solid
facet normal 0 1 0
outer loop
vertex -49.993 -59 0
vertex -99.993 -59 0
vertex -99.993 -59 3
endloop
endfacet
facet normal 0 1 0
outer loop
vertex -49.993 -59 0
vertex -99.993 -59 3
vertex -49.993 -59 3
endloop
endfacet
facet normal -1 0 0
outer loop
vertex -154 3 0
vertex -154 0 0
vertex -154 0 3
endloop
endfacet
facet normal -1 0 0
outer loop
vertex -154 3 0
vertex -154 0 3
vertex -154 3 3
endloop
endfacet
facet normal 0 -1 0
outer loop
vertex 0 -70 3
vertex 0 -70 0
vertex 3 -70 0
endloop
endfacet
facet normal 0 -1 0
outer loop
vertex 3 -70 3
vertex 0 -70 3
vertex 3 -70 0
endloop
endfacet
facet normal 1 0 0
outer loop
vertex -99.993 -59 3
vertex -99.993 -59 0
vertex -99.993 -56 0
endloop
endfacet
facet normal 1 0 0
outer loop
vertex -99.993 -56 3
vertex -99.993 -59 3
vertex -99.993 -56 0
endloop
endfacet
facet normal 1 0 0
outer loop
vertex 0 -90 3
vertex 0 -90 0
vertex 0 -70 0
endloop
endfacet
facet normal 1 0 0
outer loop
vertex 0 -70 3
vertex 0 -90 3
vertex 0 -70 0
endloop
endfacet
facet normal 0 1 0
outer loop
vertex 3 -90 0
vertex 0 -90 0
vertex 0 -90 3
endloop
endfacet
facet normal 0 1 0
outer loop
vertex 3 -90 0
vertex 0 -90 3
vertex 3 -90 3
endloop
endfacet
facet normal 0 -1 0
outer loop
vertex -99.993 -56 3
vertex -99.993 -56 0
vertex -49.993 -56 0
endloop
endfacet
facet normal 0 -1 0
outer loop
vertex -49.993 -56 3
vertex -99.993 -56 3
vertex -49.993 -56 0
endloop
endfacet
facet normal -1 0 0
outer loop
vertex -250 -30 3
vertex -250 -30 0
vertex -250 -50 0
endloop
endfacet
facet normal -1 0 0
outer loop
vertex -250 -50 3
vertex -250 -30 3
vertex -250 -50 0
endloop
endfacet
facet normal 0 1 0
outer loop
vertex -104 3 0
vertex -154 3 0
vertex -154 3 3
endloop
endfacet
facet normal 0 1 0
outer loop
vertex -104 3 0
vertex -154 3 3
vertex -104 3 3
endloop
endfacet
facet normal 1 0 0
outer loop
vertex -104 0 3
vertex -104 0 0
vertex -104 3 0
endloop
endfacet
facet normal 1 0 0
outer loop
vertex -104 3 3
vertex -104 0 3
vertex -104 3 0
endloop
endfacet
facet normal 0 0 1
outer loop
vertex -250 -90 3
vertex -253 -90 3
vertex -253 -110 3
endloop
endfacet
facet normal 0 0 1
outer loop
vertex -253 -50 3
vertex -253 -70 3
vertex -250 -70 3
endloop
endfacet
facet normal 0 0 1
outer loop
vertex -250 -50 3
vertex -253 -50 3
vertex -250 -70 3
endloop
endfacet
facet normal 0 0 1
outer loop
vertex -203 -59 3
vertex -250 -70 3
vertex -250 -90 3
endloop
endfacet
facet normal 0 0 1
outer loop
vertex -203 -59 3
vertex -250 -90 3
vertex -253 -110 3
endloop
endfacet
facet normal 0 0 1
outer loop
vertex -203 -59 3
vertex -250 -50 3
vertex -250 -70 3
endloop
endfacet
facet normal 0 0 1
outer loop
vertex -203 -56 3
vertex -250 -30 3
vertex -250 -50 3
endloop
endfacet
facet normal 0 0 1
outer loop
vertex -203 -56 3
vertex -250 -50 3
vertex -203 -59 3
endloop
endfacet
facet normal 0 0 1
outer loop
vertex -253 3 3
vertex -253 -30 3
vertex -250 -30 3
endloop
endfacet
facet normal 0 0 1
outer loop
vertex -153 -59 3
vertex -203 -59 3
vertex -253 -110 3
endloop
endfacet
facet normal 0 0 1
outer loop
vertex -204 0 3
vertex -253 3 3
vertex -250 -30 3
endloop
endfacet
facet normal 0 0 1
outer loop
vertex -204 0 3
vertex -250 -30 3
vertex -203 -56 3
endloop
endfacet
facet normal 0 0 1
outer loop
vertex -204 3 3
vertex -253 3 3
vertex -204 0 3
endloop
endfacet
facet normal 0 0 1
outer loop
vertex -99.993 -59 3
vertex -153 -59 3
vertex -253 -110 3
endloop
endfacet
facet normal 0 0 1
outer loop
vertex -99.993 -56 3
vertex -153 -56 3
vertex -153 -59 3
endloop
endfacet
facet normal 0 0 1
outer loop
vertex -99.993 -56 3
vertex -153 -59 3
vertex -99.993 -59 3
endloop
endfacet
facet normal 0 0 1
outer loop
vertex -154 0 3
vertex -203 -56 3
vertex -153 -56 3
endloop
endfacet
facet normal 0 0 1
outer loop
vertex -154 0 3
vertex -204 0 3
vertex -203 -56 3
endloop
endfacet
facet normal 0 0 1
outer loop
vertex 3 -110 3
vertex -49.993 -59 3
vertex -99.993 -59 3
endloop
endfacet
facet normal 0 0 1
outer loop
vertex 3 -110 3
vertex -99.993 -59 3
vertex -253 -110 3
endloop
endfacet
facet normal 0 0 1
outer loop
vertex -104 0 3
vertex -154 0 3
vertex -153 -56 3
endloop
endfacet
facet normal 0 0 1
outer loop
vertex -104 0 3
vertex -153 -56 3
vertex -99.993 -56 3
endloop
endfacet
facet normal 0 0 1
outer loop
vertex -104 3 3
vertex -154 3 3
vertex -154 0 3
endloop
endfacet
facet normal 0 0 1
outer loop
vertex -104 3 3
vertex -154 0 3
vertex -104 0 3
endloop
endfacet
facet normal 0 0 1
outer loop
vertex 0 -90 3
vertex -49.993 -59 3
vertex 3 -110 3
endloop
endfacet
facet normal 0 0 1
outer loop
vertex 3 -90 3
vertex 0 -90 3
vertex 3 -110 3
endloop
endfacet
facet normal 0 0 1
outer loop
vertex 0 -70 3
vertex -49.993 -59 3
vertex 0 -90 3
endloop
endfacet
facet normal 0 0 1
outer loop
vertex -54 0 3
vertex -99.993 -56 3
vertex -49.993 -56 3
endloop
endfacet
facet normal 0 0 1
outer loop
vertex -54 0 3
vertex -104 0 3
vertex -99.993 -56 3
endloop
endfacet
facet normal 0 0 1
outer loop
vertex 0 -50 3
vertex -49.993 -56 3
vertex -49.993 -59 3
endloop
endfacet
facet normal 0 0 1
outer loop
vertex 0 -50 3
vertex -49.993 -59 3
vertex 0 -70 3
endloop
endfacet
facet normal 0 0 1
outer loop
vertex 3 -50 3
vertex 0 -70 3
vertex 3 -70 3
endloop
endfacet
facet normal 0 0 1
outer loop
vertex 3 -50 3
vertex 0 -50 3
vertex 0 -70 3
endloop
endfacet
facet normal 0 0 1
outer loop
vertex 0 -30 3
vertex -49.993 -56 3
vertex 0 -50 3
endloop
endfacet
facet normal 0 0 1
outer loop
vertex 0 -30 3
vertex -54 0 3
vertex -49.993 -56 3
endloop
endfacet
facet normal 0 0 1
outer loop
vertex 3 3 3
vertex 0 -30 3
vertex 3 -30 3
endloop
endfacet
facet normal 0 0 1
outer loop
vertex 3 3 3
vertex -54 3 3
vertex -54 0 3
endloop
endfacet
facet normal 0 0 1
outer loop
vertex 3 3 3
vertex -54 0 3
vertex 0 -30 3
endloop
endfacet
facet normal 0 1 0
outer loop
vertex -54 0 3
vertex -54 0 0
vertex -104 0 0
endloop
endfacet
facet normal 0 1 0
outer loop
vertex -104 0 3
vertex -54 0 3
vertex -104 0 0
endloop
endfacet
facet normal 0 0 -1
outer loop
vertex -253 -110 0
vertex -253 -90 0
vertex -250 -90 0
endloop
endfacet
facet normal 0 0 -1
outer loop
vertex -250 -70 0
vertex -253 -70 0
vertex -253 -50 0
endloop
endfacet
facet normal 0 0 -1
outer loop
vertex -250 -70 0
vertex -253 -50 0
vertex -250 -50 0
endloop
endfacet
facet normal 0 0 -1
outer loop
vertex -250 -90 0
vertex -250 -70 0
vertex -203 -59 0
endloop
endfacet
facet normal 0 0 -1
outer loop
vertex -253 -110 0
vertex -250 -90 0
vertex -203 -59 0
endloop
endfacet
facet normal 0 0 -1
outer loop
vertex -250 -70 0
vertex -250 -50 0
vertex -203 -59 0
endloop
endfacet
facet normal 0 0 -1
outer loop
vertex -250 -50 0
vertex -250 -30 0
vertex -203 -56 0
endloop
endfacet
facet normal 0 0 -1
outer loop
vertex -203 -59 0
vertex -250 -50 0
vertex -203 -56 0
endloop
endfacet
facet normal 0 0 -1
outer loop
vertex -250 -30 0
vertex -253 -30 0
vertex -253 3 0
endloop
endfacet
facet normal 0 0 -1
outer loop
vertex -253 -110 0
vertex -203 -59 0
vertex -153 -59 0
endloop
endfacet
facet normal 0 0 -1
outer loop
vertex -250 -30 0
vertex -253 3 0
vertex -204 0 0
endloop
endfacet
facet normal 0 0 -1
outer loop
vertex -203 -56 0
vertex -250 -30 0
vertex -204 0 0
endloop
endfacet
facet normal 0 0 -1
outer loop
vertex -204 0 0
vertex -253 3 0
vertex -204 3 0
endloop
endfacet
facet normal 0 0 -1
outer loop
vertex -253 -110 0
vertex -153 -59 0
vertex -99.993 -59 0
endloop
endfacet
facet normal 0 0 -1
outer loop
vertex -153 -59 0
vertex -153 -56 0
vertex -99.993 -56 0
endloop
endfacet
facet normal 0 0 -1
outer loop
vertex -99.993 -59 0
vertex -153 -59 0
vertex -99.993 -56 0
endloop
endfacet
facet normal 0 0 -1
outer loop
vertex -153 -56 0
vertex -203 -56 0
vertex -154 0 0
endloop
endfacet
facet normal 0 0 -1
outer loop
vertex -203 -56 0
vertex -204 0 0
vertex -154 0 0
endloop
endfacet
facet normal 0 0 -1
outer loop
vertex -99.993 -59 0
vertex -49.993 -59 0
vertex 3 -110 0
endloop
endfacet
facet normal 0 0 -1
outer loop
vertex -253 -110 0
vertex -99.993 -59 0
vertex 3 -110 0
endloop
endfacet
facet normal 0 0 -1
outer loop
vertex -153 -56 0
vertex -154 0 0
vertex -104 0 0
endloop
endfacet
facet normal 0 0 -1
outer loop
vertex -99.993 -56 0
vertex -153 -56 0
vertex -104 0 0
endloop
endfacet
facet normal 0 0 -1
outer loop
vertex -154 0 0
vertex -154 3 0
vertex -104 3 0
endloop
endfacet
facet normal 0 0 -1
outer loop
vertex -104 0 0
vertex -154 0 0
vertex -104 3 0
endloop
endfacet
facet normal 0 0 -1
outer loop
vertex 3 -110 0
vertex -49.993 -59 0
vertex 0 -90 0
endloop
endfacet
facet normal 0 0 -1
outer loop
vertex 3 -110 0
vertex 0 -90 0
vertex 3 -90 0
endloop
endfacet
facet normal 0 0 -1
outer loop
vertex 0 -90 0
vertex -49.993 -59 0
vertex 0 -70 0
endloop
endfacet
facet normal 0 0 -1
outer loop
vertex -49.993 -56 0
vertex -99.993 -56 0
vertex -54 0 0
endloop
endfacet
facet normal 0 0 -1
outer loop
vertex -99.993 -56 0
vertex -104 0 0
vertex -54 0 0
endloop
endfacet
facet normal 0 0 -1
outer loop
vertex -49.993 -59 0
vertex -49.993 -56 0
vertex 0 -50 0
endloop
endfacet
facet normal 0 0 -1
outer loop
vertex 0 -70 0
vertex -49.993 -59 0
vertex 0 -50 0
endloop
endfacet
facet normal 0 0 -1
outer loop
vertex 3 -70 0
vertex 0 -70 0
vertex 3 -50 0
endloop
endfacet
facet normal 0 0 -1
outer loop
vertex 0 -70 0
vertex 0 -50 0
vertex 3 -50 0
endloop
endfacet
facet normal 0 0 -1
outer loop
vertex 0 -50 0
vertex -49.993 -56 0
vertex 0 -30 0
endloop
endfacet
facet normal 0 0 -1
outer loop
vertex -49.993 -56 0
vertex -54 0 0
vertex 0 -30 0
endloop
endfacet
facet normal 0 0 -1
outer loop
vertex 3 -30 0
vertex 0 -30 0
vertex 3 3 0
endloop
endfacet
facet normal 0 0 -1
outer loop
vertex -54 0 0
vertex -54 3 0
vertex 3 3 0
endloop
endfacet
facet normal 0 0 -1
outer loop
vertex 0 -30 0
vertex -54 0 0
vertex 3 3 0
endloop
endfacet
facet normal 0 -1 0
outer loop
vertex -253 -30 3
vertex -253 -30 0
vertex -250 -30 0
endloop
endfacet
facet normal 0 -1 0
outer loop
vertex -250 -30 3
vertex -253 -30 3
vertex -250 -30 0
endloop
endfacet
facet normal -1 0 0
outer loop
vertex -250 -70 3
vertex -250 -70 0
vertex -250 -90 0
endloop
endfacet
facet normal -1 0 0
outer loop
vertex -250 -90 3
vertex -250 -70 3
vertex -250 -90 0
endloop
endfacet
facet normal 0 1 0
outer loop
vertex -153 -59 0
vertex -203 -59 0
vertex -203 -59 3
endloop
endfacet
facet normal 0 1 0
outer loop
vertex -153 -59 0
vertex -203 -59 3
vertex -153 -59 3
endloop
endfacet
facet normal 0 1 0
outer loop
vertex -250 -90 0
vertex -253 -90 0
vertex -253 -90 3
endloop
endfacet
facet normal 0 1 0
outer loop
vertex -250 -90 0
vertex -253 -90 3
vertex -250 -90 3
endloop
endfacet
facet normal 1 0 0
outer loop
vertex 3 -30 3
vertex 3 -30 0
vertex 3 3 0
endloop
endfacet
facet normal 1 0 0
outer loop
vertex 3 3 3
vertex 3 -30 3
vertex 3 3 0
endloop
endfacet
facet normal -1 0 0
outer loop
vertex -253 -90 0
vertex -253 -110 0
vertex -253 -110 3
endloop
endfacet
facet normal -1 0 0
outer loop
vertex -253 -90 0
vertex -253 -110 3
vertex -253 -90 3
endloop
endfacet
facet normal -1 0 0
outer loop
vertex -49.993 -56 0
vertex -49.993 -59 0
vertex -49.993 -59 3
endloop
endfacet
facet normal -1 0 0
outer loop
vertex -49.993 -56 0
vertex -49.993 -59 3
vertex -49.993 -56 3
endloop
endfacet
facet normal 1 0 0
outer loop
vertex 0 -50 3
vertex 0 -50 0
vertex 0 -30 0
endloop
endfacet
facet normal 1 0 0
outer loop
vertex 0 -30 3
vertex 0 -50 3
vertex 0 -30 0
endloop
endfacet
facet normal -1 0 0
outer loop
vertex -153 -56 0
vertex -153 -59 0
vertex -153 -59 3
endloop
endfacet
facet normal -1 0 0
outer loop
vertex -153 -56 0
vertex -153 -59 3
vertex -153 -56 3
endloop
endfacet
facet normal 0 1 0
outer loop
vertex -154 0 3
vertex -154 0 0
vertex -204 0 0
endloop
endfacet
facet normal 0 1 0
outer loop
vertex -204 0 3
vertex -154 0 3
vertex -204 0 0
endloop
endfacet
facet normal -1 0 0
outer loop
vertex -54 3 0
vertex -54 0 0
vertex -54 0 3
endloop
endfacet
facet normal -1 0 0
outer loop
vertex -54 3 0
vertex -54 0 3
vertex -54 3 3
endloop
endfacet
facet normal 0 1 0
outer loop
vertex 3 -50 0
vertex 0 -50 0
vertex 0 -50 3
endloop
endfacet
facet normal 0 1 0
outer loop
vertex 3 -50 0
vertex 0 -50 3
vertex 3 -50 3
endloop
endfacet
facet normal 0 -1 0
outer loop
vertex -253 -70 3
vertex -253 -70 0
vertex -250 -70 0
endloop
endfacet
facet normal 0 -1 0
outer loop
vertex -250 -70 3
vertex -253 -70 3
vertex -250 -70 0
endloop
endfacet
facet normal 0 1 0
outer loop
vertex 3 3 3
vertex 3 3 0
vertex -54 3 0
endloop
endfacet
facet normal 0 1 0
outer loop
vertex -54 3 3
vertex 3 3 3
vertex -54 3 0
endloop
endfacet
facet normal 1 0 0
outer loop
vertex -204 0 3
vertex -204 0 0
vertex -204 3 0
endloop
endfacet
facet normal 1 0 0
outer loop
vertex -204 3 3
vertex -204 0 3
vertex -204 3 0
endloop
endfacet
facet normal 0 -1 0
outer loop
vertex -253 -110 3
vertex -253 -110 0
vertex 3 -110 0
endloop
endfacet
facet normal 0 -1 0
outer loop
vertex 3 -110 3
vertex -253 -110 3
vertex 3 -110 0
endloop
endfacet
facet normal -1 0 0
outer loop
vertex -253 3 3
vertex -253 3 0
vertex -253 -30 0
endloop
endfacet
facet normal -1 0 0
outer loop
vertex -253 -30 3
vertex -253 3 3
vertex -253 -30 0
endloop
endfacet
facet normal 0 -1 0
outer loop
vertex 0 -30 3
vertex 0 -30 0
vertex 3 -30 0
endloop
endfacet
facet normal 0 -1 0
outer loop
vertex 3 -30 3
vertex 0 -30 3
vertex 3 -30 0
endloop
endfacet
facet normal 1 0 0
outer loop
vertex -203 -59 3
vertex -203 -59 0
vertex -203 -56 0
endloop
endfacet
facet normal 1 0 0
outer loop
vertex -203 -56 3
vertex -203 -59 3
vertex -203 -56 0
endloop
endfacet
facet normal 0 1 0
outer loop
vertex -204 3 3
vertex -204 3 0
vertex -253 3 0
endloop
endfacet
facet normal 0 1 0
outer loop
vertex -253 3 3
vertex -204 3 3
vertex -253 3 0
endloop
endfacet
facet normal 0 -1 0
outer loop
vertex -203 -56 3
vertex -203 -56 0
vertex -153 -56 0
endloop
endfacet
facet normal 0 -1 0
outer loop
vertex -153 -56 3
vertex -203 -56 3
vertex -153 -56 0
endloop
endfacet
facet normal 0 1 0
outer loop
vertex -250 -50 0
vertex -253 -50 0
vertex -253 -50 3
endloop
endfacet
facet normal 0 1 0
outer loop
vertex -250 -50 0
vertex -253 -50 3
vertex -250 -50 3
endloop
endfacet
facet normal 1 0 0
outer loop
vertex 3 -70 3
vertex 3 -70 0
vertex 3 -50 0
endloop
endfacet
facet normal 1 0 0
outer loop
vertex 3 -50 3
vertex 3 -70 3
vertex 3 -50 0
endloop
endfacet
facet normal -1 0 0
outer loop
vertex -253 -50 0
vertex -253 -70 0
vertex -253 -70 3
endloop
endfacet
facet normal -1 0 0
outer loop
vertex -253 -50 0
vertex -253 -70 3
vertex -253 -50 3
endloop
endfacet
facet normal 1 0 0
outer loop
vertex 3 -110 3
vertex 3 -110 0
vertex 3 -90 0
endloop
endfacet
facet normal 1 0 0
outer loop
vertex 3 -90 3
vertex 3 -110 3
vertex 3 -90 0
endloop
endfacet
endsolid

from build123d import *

# Parameters (mm, degrees)
F0_W     = 46
F0_H     = 3
F0_W_2   = 50
F0_W_3   = 3
F0_H_2   = 20
F0_W_4   = 54
F1_DEPTH = 3


with BuildPart() as f1:
    # F0 (on Top) → F1 (new body)
    with BuildSketch(Plane.XY):
        with Locations((-227, 1.5)):
            Rectangle(F0_W, F0_H)
        Polygon((-204, 0), (-250, 0), (-250, -30), (-250, -50), (-250, -70), (-250, -90), (-250, -110), (0, -110), (0, -90), (0, -70), (0, -50), (0, -30), (0, 0), (-54, 0), (-104, 0), (-154, 0), align=None)
        with Locations((-178, -57.5)):
            Rectangle(F0_W_2, F0_H, mode=Mode.SUBTRACT)
        with Locations((-74.99309, -57.5)):
            Rectangle(F0_W_2, F0_H, mode=Mode.SUBTRACT)
        Polygon((-250, -30), (-250, 0), (-250, 3), (-253, 3), (-253, -30), align=None)
        with Locations((-129, 1.5)):
            Rectangle(F0_W_2, F0_H)
        with Locations((-251.5, -60)):
            Rectangle(F0_W_3, F0_H_2)
        with Locations((-27, 1.5)):
            Rectangle(F0_W_4, F0_H)
        with Locations((-251.5, -100)):
            Rectangle(F0_W_3, F0_H_2)
        Polygon((0, 3), (0, 0), (0, -30), (3, -30), (3, 3), align=None)
        with Locations((1.5, -100)):
            Rectangle(F0_W_3, F0_H_2)
        with Locations((1.5, -60)):
            Rectangle(F0_W_3, F0_H_2)
    extrude(amount=F1_DEPTH)


solid = f1.part
